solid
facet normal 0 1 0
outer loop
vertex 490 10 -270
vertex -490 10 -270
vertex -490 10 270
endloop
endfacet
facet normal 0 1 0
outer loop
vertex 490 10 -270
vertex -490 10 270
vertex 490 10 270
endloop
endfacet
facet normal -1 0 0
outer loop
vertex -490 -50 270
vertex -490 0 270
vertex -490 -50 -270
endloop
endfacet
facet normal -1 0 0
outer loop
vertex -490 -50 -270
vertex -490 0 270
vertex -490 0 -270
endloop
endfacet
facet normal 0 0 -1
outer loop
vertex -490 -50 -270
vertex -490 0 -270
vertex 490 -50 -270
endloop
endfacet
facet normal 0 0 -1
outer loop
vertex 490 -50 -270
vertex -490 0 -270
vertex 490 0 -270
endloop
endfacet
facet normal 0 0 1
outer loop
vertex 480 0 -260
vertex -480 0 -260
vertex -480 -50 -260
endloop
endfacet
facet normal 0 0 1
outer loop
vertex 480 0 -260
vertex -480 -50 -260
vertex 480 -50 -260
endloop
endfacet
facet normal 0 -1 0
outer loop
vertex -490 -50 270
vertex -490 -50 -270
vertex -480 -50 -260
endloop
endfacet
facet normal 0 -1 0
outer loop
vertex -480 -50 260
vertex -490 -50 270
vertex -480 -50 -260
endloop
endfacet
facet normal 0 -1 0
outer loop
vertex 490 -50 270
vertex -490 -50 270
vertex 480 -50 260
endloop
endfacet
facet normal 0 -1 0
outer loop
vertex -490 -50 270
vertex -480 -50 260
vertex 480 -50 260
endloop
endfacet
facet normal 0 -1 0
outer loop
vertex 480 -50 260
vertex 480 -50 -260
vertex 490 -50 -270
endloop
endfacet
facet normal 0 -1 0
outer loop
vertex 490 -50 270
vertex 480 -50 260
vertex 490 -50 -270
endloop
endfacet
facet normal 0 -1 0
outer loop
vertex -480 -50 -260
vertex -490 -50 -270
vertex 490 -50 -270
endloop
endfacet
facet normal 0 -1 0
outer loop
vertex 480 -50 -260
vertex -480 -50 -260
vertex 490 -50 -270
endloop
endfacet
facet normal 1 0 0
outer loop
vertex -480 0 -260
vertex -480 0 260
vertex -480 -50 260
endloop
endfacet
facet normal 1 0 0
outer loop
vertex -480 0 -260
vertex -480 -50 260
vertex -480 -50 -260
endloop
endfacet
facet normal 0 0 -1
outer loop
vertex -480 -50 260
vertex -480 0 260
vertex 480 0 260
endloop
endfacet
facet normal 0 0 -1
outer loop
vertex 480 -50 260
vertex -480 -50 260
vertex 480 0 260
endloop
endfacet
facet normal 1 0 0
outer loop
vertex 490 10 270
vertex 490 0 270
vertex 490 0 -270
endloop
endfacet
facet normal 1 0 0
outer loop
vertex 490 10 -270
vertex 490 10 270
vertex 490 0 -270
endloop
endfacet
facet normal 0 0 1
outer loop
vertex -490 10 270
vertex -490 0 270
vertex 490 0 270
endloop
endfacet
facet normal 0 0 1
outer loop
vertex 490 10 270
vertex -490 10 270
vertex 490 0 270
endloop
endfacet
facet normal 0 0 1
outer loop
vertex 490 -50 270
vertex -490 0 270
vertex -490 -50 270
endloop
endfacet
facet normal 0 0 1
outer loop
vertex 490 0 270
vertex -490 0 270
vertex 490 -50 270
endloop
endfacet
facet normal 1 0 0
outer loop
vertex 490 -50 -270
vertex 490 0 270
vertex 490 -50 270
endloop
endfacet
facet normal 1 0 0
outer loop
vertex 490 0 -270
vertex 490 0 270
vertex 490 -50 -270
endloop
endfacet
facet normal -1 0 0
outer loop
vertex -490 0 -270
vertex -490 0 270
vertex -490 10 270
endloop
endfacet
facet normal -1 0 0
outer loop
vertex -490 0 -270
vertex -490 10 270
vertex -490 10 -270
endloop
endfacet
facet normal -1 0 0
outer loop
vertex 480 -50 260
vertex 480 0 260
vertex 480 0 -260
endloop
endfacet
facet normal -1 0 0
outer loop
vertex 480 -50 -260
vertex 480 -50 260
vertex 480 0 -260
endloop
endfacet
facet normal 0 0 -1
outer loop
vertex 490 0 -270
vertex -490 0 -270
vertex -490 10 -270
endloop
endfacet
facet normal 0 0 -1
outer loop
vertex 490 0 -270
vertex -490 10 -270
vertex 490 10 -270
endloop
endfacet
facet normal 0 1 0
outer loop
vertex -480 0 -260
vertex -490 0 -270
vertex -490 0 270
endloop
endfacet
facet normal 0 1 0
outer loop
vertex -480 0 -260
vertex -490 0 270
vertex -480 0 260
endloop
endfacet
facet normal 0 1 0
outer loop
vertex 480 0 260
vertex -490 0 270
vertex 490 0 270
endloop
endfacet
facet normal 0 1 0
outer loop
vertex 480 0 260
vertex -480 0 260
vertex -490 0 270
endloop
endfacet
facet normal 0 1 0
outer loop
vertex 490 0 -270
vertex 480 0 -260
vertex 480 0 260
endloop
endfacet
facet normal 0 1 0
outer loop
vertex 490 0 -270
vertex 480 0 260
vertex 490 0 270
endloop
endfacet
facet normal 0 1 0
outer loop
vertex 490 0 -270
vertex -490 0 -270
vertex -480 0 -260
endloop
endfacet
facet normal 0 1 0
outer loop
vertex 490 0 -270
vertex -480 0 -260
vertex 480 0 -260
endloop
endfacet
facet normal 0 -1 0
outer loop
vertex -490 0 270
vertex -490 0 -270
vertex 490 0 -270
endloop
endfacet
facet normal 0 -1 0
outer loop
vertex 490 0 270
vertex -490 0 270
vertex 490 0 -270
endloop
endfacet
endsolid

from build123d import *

# Parameters (mm, degrees)
SKETCH1_W           = 980
SKETCH1_H           = 540
BOSS_EXTRUDE1_DEPTH = 10
SKETCH1_3_W         = 980
SKETCH1_3_H         = 540
SKETCH1_3_W_2       = 960
SKETCH1_3_H_2       = 520
BOSS_EXTRUDE2_DEPTH = 50


with BuildPart() as part:
    # Sketch1 → Boss-Extrude1 (new body)
    with BuildSketch(Plane(origin=(0, 0, 0), x_dir=(1, 0, 0), z_dir=(0, 1, 0))):
        Rectangle(SKETCH1_W, SKETCH1_H)
    extrude(amount=BOSS_EXTRUDE1_DEPTH)


with BuildPart() as body_2:
    # Sketch1<3> → Boss-Extrude2 (new body)
    with BuildSketch(Plane(origin=(0, 0, 0), x_dir=(1, 0, 0), z_dir=(0, 1, 0))):
        Rectangle(SKETCH1_3_W, SKETCH1_3_H)
        Rectangle(SKETCH1_3_W_2, SKETCH1_3_H_2, mode=Mode.SUBTRACT)
    extrude(amount=-BOSS_EXTRUDE2_DEPTH)


solid = Compound([part.part, body_2.part])
